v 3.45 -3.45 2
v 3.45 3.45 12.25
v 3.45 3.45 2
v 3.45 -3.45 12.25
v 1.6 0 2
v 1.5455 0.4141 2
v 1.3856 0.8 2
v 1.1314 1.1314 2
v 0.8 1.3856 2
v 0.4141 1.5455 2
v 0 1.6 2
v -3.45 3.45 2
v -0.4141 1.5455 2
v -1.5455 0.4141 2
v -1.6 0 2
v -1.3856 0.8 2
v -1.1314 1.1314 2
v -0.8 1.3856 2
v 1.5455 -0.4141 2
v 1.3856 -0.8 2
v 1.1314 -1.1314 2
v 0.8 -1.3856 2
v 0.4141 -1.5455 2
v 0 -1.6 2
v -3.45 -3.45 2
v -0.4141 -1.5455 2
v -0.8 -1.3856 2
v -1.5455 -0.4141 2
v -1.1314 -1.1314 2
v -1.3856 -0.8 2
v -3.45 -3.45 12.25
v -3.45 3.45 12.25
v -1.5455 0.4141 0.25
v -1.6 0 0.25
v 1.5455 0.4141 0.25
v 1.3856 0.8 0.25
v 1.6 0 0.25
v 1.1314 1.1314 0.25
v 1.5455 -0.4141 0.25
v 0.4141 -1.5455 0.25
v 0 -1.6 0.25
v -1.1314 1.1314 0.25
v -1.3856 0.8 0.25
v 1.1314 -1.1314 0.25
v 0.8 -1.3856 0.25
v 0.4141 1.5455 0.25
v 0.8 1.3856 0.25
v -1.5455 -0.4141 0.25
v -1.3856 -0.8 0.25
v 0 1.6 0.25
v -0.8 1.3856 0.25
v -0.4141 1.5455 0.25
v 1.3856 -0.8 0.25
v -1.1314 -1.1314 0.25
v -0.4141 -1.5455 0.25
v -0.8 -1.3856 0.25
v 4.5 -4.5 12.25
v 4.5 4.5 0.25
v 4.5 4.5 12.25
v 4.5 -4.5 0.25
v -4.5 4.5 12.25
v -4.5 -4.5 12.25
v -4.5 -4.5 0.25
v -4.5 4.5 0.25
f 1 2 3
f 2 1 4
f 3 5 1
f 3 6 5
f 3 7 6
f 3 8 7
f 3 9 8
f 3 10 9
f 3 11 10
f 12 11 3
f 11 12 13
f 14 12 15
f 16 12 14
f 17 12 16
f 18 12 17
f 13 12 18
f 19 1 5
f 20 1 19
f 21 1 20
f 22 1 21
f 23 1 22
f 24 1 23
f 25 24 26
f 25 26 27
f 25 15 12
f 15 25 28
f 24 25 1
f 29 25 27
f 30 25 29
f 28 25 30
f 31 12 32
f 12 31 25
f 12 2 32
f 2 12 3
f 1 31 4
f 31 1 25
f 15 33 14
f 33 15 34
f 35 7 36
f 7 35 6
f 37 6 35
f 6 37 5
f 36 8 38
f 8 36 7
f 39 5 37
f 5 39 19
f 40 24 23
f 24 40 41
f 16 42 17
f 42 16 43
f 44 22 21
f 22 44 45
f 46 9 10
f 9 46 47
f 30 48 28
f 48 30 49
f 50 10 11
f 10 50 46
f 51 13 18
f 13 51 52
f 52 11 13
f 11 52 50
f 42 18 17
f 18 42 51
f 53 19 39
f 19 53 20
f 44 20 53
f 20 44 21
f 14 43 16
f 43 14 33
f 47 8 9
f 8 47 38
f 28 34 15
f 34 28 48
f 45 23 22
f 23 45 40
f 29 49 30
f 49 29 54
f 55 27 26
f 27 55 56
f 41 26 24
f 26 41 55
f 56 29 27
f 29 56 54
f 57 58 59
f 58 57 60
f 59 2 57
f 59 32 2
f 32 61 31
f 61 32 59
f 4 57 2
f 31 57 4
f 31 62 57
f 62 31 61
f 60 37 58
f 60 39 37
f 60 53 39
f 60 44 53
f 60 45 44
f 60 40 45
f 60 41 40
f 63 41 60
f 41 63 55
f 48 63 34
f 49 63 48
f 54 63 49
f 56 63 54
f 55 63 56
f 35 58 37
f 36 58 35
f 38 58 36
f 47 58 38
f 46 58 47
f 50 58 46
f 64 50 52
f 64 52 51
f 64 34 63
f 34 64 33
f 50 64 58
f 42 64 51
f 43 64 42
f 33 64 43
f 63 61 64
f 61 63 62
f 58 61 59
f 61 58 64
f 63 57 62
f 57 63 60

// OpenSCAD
// file: 3dprinter.scad
//BioDeploy SCAD file = 3dprinter.scad


//choose the max specs for your 3d printer
//here we use a replicator2x specs

x_print_max = 25*10;
y_print_max = 15.2*10;
z_print_max = 15.5*10;

//don't forget *10 to put in centimeters
// file: generator_variables.scad
//===============================================//
//===============================================//
// BioDeploy SCAD file = generator_variables.scad//
//                 Start File                    //
//===============================================//
//===============================================//
//-----------------------------------------------//
include <3dprinter.scad>
//===============================================//
//                   variables                   //
//===============================================//
//===============================================//
pad = 0.1; //padding
//choose the spec for your generator
//===============================================//
//                    magnets1                   //
//===============================================//
//Volume :
x_magnet = 5.5;
y_magnet = 21.5;
z_magnet = 21.5;
//Number of magnets on the rotor :
nbmagnetsonrotor = 16;
rotor_ext_max = 60;
//===============================================//
//                    magnets2                   //
//===============================================//
//Volume :
diam_magnet2 = 35;
z_magnet2 = 5;
//Number of magnets on the rotor :
nbmagnetsonrotor2 = 6;
//===============================================//
//                      rotor                    //
//===============================================//
smooth_rotor = 100;
smooth_bobine = 100;
z_rotor_int = 20;
//===============================================//
//                  adapter_rotor                //
//===============================================//
diam_adapter_max = 32 ;
diam_adapter_min = 25.15 ;
h_adapter = 7;
h_adapter_box = 12;
nbarm = 6;
//===============================================//
//                    Bobine1                    //
//===============================================//
r_bobine_ext_max = y_magnet/2;
r_bobine_ext_min = 4.5;
r_bobine_int = 3.5;

x_bobine = 30;
p_bobine_ext = 1;

r_bobine2_ext_min = 3.4;
r_bobine2_int = 2.5;

wire_in = 1;
wire_out = 1;


//===============================================//
//                    Protector                  //
//===============================================//

r_bobine_protector_ext_max = y_magnet/2 + 1.5;
gap_bobine_protector = (r_bobine_protector_ext_max - r_bobine_ext_max)/2;


x_bobine_protector=x_bobine+1.5;

smooth_protector = 100;

//===============================================//
//                    Socle1                     //
//===============================================//

r_socle_int = 0;
r_socle_ext = 0;
position_bobine_in = 0;
position_bobine_out = 0;
connector_socle_female =0;
connector_socle_male =0;
space_marge=3;

//-----------------------------------------------//
//===============================================//
//===============================================//
// BioDeploy SCAD file = generator_variables.scad//
//                   End  File                   //
//===============================================//
//===============================================//
// main file
//===============================================//
//===============================================//
//BioDeploy SCAD file = generator_rotor_adapter_cap_hdd.scad//
//                 Start File                    //
//===============================================//
//===============================================//
//-----------------------------------------------//

//===============================================//
//                   variables                   //
//===============================================//
include <generator_variables.scad>
//===============================================//
//               Calls for use                   //
//===============================================//
//use <generator_logo.scad>
//===============================================//
//                    Trees                      //
//===============================================//

module armcap() {
translate([0,0,8])cube([6.9,6.9,12], center=true);
}




module armcapbase() {
translate([0,0,12.5/2])cube([9,9,12], center=true);
}



module armcapscrewdif() {translate([0,0,0])cylinder(50,1.6,1.6,$fn=24,center=true);}

module caps(){
difference() {
armcapbase();
union(){
armcap();
armcapscrewdif();
}
}
}


caps();


//-----------------------------------------------//
//===============================================//
//===============================================//
//BioDeploy SCAD file = generator_rotor_adapter_cap_hdd.scad//
//                   End  File                   //
//===============================================//
//===============================================//
